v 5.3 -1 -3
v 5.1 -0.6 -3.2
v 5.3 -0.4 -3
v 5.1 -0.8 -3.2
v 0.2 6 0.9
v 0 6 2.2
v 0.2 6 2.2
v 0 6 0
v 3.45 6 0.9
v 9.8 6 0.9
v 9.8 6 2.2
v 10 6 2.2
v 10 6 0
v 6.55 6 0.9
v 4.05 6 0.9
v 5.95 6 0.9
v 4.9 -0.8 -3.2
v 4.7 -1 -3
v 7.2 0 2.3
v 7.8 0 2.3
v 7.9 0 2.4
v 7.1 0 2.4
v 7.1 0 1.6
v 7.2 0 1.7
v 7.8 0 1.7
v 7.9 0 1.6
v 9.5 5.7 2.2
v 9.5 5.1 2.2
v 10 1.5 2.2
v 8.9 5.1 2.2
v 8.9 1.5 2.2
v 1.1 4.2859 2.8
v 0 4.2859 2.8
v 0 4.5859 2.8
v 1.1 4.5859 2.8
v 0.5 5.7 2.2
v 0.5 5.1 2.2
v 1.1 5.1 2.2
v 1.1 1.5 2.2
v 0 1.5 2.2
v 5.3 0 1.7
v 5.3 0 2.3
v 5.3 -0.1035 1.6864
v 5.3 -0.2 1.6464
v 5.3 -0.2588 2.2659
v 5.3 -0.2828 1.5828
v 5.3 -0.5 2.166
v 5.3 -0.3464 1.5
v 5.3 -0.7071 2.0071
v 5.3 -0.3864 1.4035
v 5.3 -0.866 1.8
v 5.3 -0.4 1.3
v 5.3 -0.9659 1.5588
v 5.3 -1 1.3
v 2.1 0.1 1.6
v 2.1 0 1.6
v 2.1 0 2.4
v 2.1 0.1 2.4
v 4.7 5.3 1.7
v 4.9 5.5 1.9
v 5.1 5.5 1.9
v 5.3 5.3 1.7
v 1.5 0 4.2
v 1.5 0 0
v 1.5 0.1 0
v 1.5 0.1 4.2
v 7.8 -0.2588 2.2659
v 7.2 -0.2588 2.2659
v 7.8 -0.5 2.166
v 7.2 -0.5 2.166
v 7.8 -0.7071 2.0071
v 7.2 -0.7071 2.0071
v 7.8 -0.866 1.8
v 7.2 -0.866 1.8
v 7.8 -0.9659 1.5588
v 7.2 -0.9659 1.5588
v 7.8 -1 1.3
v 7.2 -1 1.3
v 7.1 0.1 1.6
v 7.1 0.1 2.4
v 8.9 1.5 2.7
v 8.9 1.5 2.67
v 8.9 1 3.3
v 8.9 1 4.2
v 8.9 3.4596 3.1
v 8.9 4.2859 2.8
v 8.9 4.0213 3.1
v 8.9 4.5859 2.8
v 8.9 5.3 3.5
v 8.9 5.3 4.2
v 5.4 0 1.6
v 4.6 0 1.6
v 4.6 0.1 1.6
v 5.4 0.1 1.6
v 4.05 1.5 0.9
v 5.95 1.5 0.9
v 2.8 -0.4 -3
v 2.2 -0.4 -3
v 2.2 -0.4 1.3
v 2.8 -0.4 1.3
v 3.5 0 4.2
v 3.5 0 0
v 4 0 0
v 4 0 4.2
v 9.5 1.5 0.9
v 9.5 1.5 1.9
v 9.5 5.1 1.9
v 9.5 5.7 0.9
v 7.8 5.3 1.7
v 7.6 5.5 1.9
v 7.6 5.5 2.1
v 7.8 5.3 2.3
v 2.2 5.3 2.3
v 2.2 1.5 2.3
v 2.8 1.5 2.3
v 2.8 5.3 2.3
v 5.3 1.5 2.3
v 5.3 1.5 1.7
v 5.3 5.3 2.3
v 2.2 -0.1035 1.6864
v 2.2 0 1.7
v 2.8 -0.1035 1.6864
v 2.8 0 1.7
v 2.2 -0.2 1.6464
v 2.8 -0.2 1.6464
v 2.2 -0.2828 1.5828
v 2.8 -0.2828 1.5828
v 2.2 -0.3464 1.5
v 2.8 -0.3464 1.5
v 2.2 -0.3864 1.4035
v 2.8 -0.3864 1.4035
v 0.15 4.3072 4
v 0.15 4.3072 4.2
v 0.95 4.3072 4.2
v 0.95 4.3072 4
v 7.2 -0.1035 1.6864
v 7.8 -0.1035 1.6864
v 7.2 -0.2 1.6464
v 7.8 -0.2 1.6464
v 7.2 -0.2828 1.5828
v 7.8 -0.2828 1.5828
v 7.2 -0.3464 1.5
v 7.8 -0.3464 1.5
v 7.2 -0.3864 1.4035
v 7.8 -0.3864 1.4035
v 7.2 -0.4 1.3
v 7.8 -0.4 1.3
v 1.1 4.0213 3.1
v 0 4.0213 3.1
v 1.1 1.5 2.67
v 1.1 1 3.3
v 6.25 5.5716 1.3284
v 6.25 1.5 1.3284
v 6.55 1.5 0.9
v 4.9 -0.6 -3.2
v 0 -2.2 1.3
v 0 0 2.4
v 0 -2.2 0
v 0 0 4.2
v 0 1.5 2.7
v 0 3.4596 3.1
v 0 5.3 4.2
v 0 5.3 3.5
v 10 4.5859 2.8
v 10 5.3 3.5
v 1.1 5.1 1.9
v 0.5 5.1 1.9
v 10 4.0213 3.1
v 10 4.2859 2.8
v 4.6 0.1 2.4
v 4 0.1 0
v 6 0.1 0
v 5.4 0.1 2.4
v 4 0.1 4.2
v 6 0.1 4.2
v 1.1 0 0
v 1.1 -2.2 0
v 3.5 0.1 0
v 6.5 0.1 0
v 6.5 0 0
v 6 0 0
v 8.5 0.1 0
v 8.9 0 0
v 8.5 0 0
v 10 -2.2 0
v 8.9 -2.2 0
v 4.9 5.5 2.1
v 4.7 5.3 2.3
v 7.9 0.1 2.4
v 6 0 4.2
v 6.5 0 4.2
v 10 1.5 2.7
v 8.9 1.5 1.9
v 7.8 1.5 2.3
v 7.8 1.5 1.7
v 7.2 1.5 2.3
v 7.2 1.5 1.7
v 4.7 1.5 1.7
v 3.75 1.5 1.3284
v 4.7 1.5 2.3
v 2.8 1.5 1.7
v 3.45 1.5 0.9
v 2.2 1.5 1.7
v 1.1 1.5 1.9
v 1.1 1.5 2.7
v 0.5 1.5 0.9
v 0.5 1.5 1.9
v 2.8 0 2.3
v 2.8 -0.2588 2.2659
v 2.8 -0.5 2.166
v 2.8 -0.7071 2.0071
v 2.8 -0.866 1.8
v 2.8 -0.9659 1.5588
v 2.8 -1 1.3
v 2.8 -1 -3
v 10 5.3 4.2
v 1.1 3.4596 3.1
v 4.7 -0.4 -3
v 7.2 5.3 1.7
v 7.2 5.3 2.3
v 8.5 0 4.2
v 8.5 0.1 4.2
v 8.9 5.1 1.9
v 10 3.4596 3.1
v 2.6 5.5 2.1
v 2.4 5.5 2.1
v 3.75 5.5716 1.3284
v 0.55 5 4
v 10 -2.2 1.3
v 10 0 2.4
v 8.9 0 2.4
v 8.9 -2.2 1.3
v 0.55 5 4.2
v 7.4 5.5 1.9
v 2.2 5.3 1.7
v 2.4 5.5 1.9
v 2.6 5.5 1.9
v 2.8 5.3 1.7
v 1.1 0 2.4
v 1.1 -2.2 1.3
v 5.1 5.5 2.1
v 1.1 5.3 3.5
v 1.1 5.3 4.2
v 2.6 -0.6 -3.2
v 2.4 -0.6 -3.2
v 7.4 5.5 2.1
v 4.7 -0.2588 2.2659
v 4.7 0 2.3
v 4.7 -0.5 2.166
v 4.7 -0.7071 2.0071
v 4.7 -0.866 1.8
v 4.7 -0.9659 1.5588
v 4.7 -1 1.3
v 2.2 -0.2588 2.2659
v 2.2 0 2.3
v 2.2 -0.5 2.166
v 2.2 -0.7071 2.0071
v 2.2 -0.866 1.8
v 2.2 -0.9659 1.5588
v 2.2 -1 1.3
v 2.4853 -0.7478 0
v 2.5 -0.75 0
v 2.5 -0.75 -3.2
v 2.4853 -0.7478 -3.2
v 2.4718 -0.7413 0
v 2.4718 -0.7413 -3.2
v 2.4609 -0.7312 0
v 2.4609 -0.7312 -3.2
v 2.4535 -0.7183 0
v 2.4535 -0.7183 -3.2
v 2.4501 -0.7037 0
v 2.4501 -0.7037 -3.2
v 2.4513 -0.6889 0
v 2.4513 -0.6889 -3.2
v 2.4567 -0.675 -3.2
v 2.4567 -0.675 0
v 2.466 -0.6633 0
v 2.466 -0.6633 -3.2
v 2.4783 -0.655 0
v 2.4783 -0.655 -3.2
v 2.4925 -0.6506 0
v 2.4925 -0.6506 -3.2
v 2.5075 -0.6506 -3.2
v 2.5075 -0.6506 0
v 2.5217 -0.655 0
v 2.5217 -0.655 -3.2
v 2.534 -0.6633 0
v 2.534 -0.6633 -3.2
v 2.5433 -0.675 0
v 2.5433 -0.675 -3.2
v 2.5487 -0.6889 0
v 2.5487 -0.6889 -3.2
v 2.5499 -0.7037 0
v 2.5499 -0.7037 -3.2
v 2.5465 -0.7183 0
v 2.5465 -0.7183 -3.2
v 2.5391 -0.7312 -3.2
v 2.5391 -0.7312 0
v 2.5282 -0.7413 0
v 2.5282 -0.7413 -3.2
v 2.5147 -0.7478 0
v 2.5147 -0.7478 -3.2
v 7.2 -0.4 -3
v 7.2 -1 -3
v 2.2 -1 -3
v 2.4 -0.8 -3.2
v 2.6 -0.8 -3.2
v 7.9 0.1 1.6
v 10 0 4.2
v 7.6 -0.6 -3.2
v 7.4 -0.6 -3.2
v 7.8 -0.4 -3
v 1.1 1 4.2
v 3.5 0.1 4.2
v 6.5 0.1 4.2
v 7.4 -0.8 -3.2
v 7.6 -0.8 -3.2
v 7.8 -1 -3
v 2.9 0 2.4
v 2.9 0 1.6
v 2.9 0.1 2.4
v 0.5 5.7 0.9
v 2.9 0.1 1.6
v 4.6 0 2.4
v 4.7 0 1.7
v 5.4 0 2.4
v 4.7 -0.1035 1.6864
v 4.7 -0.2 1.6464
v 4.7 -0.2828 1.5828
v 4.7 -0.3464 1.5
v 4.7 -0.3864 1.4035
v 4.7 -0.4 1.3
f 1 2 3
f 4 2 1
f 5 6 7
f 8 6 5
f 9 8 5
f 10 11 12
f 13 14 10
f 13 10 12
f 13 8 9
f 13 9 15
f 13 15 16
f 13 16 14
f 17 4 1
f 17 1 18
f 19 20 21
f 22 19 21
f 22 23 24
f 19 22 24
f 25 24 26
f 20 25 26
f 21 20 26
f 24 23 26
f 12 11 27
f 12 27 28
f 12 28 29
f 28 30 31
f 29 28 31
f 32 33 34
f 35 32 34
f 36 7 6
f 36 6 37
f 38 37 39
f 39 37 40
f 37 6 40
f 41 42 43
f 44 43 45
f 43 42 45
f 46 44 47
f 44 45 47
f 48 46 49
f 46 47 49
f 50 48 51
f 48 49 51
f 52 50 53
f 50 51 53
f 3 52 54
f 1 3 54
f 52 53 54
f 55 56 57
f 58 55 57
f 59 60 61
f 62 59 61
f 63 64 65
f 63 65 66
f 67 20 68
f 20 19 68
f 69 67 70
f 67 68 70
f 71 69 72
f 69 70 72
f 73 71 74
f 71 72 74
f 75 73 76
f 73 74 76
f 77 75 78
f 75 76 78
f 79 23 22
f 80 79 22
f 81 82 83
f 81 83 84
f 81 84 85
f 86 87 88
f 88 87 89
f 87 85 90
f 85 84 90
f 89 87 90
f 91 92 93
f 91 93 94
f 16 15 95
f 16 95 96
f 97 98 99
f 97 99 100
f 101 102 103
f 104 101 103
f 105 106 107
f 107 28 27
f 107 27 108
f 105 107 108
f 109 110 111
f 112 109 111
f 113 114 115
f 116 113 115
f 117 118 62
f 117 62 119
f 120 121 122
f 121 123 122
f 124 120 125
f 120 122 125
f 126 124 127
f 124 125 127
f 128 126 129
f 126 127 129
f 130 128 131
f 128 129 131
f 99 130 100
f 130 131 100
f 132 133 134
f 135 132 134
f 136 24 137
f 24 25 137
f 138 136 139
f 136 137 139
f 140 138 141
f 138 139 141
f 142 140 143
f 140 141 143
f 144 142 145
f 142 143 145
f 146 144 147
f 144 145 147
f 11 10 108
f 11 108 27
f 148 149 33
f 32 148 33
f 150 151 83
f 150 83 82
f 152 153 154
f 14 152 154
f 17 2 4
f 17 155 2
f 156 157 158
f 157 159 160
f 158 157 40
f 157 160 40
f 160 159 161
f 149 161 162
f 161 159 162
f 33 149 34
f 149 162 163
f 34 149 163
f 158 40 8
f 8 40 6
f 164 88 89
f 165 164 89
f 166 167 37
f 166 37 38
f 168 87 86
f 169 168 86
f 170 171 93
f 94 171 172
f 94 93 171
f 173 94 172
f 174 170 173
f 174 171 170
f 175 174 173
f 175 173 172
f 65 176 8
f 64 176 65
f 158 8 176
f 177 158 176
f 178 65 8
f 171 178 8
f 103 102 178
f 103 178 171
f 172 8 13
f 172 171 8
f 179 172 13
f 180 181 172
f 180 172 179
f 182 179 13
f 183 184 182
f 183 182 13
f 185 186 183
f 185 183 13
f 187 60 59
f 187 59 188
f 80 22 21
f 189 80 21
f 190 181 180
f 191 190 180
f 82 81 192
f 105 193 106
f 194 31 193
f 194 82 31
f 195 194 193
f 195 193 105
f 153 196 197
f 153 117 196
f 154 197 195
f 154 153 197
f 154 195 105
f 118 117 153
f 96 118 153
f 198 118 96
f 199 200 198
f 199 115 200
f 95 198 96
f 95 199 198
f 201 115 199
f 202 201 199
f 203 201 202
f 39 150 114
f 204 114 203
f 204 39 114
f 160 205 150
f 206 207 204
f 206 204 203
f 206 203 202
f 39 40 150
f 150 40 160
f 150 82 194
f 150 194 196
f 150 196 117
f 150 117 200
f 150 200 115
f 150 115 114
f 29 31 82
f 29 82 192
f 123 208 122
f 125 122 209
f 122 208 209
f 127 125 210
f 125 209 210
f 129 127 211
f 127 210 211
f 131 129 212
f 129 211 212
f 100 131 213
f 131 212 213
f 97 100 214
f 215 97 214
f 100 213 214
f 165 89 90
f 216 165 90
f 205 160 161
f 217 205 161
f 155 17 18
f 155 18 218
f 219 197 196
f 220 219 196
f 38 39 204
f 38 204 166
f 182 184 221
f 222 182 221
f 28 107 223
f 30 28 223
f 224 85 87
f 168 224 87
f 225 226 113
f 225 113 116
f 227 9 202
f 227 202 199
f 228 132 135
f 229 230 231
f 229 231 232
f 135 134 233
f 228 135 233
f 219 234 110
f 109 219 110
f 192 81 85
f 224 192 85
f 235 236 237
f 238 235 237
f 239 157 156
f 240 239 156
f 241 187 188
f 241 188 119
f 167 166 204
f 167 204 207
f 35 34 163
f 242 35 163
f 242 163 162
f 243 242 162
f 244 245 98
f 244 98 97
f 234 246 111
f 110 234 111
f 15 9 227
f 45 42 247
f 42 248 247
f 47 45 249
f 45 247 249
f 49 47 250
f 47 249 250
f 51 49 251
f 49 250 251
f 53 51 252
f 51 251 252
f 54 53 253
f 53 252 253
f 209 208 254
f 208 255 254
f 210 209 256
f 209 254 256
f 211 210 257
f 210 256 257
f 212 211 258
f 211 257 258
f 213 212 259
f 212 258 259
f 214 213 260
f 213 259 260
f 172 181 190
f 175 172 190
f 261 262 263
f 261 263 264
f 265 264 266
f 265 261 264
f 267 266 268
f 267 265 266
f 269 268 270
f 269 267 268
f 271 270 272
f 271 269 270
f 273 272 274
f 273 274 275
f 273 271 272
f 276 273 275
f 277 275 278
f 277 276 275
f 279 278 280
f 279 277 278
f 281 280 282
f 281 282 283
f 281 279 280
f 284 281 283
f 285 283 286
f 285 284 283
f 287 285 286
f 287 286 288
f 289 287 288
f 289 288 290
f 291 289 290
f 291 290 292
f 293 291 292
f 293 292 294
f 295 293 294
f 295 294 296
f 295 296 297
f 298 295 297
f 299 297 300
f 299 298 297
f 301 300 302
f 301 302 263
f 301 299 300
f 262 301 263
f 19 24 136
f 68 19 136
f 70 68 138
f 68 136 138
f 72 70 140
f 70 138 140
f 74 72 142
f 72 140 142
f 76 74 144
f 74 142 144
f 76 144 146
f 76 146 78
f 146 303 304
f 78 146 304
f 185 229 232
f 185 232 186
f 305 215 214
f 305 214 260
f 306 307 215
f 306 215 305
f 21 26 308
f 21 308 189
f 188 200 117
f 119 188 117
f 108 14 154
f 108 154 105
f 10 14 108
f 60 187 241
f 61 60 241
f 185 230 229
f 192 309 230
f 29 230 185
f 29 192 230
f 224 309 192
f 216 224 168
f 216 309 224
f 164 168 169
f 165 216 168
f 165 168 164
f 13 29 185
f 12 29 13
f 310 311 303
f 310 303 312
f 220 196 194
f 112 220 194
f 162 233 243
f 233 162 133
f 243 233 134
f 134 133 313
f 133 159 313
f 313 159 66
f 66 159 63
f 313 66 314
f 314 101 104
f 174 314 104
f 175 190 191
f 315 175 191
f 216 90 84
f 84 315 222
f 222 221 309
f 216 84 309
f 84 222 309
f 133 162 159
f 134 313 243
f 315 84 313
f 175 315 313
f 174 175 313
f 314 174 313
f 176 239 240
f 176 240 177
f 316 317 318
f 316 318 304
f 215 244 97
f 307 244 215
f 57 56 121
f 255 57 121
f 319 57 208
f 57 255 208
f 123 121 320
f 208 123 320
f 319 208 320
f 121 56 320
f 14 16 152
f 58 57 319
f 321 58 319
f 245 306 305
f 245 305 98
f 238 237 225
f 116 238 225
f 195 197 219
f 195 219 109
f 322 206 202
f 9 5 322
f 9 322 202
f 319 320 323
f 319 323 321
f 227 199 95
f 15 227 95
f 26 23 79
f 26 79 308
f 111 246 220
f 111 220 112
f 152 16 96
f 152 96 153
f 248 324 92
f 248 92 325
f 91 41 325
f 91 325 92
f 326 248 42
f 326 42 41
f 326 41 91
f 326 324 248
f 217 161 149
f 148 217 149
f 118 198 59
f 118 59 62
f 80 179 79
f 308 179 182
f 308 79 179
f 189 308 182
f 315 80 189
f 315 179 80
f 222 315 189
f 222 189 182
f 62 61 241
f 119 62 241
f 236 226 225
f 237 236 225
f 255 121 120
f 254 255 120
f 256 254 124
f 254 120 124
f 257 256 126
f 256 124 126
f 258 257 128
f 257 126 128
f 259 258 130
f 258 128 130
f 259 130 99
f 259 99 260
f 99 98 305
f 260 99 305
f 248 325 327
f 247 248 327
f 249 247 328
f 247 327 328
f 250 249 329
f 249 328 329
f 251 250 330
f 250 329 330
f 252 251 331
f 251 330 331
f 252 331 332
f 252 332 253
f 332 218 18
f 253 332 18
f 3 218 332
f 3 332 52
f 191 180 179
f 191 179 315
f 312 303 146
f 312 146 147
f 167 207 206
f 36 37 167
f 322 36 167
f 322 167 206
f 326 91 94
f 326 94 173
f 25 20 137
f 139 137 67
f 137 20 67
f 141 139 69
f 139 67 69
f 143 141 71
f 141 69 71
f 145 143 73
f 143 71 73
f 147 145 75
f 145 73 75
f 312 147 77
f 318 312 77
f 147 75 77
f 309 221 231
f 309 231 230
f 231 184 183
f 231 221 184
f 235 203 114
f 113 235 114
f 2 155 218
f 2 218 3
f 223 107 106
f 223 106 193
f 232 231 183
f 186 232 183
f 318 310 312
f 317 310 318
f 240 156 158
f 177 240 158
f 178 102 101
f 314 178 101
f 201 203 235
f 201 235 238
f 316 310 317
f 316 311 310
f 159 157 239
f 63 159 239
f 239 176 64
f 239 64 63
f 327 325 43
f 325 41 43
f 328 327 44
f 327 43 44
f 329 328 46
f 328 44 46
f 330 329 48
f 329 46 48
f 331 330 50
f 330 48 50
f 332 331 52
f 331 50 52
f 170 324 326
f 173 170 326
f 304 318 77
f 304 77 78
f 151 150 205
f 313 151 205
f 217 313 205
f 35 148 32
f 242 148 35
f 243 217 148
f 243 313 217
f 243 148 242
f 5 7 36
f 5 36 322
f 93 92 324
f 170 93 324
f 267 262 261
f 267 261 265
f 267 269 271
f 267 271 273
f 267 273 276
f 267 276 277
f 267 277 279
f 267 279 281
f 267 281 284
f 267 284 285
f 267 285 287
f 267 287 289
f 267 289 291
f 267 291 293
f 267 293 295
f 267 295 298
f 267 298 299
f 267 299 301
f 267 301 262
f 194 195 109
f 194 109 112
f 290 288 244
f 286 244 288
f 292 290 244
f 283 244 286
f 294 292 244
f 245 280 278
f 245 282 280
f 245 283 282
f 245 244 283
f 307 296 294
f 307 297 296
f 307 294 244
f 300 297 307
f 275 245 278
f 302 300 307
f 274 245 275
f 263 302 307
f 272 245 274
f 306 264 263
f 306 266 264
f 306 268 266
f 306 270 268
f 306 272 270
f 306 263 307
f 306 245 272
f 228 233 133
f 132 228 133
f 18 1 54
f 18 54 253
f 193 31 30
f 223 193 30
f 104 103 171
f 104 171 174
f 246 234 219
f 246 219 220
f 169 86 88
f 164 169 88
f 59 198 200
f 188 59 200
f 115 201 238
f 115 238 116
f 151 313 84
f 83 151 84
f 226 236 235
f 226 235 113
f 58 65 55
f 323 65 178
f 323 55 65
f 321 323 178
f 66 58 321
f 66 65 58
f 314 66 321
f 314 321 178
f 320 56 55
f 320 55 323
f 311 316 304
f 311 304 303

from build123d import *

# Parameters (mm, degrees)
SKETCH_1_W                         = 10
SKETCH_1_H                         = 4.2
EXTRUDE_1_DEPTH                    = 6
CUT_EXTRUDE_1_DEPTH                = 5
CUT_EXTRUDE_2_DEPTH                = 13.395160346
EXTRUDE_6_DEPTH                    = 1.1
CUT_EXTRUDE_3_REACH                = 14.395
SKETCH_5_W                         = 7.8
SKETCH_5_H                         = 4.3
EXTRUDE_3_REACH                    = 13.995
EXTRUDE_5_REACH                    = 15.597
SKETCH_11_W                        = 2
SKETCH_11_H                        = 4.2
SKETCH_11_W_2                      = 0.8
SKETCH_11_H_2                      = 0.8
CUT_EXTRUDE_5_DEPTH                = 0.1
SKETCH_15_R                        = 0.05
CUT_EXTRUDE_6_DEPTH                = 0.1
PATTERN_LINEAR_2_COUNT             = 2
PATTERN_LINEAR_2_PITCH             = 2.5
CUT_EXTRUDE_7_DEPTH                = 0.2
SKETCH_7_W                         = 0.6
SKETCH_7_H                         = 0.6
EXTRUDE_4_DEPTH                    = 5.5
SKETCH_18_W                        = 0.6
SKETCH_18_H                        = 0.6
CHAMFER_6_SIZE                     = 0.2
PATTERN_LINEAR_1_COUNT             = 3
PATTERN_LINEAR_1_PITCH             = 2.5
CHAMFER_6_OF_PATTERN_LINEAR_1_SIZE = 0.2
CUT_EXTRUDE_4_REACH                = 13.995
SKETCH_20_W                        = 0.6
SKETCH_20_H                        = 0.3
CUT_EXTRUDE_9_DEPTH                = 0.9
CHAMFER_5_SIZE                     = 0.3
SKETCH_19_R                        = 0.05
CUT_EXTRUDE_8_DEPTH                = 3.2


with BuildPart() as part:
    # Эскиз1 → Бобышка-Вытянуть1 (new body)
    with BuildSketch(Plane(origin=(0, 0, 0), x_dir=(1, 0, 0), z_dir=(0, 1, 0))):
        with Locations((5, -2.1)):
            Rectangle(SKETCH_1_W, SKETCH_1_H)
    extrude(amount=EXTRUDE_1_DEPTH)

    # Эскиз2 → Вырез-Вытянуть1 (cut)
    with BuildSketch(Plane(origin=(0, 6, 0), x_dir=(1, 0, 0), z_dir=(0, 1, 0))):
        Polygon((0.5, -0.9), (9.5, -0.9), (9.5, -1.9), (8.9, -1.9), (8.9, -3.7), (1.1, -3.7), (1.1, -1.9), (0.5, -1.9), align=None)
    extrude(amount=-CUT_EXTRUDE_1_DEPTH, mode=Mode.SUBTRACT)

    # Эскиз3 → Вырез-Вытянуть2 (cut, through all)
    with BuildSketch(Plane.ZY):
        Polygon((2.2, 6), (2.2, 1.5), (2.7, 1.5), (3.1, 3.459591794), (3.1, 4.021282026), (2.8, 4.285857157), (2.8, 4.585857157), (3.5, 5.3), (4.2, 5.3), (4.2, 6), align=None)
    extrude(amount=-CUT_EXTRUDE_2_DEPTH, mode=Mode.SUBTRACT)

    # Эскиз16 → Бобышка-Вытянуть6 (add)
    with BuildSketch(Plane(origin=(10, 0, 0), x_dir=(0, 0, -1), z_dir=(1, 0, 0))):
        Polygon((-2.4, 0), (-1.3, -2.2), (0, -2.2), (0, 0), align=None)
    extrude_6 = extrude(amount=-EXTRUDE_6_DEPTH)

    # Зеркальное отражение2: Бобышка-Вытянуть6 across plane
    add(extrude_6.mirror(Plane(origin=(5, 0, 0), x_dir=(0, 0, 1), z_dir=(1, 0, 0))))

    # Эскиз5 → Вырез-Вытянуть3 (cut, up to next)
    with BuildSketch(Plane.XY.offset(4.2), mode=Mode.PRIVATE) as cut_extrude_3_sk1:
        with Locations((5, 3.15)):
            Rectangle(SKETCH_5_W, SKETCH_5_H)
    cut_extrude_3_tool1 = extrude(cut_extrude_3_sk1.sketch, amount=-CUT_EXTRUDE_3_REACH, mode=Mode.PRIVATE) & part.part
    add(cut_extrude_3_tool1.solids().sort_by_distance((5, 3.15, 4.2))[0], mode=Mode.SUBTRACT)

    # Эскиз6 → Бобышка-Вытянуть3 (add, up to next)
    with BuildSketch(Plane(origin=(0.5, 0, 0), x_dir=(0, 0, -1), z_dir=(1, 0, 0)), mode=Mode.PRIVATE) as extrude_3_sk1:
        Polygon((-3.3, 1), (-2.67, 1.5), (-0.9, 1.5), (-0.9, 1), align=None)
    extrude_3_tool1 = extrude(extrude_3_sk1.sketch, amount=EXTRUDE_3_REACH, mode=Mode.PRIVATE) - part.part
    add(extrude_3_tool1.solids().sort_by_distance((0.5, 1.23741, 1.950432))[0])

    # Эскиз9 → Бобышка-Вытянуть5 (add, up to next)
    with BuildSketch(Plane(origin=(0, 6, 0), x_dir=(1, 0, 0), z_dir=(0, 1, 0)), mode=Mode.PRIVATE) as extrude_5_sk1:
        Polygon((3.45, -0.9), (3.75, -1.328444402), (4.05, -0.9), align=None)
    extrude_5_tool1 = extrude(extrude_5_sk1.sketch, amount=-EXTRUDE_5_REACH, mode=Mode.PRIVATE) - part.part
    extrude_5 = extrude_5_tool1.solids().sort_by_distance((3.75, 6, 1.042815))[0]
    add(extrude_5)

    # Эскиз11 → Вырез-Вытянуть5 (cut)
    with BuildSketch(Plane.XZ):
        with Locations((2.5, 2.1)):
            Rectangle(SKETCH_11_W, SKETCH_11_H)
        with Locations((2.5, 2)):
            Rectangle(SKETCH_11_W_2, SKETCH_11_H_2, mode=Mode.SUBTRACT)
    cut_extrude_5 = extrude(amount=-CUT_EXTRUDE_5_DEPTH, mode=Mode.SUBTRACT)

    # Эскиз15 → Вырез-Вытянуть6 (cut)
    with BuildSketch(Plane.XZ):
        with Locations(Location((2.5, 2, 0), (0, 0, 270))):
            Circle(SKETCH_15_R)
    extrude(amount=-CUT_EXTRUDE_6_DEPTH, mode=Mode.SUBTRACT)

    # Линейный массив2: Бобышка-Вытянуть5 ×2
    with Locations(*[(i * PATTERN_LINEAR_2_PITCH, 0, 0) for i in range(1, PATTERN_LINEAR_2_COUNT)]):
        add(extrude_5)

    # Эскиз17 → Вырез-Вытянуть7 (cut)
    with BuildSketch(Plane.XY.offset(4.2)):
        Polygon((0.55, 5), (0.15, 4.307179677), (0.95, 4.307179677), align=None)
    extrude(amount=-CUT_EXTRUDE_7_DEPTH, mode=Mode.SUBTRACT)

    # Эскиз7 → Бобышка-Вытянуть4 (add)
    with BuildSketch(Plane.XZ):
        with Locations((2.5, 2)):
            Rectangle(SKETCH_7_W, SKETCH_7_H)
    extrude_4 = extrude(amount=-EXTRUDE_4_DEPTH)

    # По траектории1: sweep along a curve in space
    with BuildLine() as sweep_1_path:
        Line((2.5, -0.7, 1.3), (2.5, -0.7, -3.2))
        ThreePointArc((2.5, 0, 2), (2.5, -0.494974747, 1.794974747), (2.5, -0.7, 1.3))
    # Эскиз18 → По траектории1 (sweep)
    with BuildSketch(Plane.XZ):
        with Locations((2.5, 2)):
            Rectangle(SKETCH_18_W, SKETCH_18_H)
    sweep_1 = sweep(path=sweep_1_path.line)

    # Фаска6
    chamfer_6_edges = [part.edges().sort_by_distance(p)[0] for p in [
        (2.8, 5.5, 2),
        (2.5, 5.5, 1.7),
        (2.2, 5.5, 2),
        (2.5, 5.5, 2.3),
        (2.8, -0.7, -3.2),
        (2.5, -1, -3.2),
        (2.2, -0.7, -3.2),
        (2.5, -0.4, -3.2),
    ]]
    chamfer(chamfer_6_edges, length=CHAMFER_6_SIZE)

    # Линейный массив1: Вырез-Вытянуть5, Бобышка-Вытянуть4, По траектории1 ×3
    with Locations(*[(i * PATTERN_LINEAR_1_PITCH, 0, 0) for i in range(1, PATTERN_LINEAR_1_COUNT)]):
        add(cut_extrude_5, mode=Mode.SUBTRACT)
        add(extrude_4)
        add(sweep_1)

    # Фаска6 of Линейный массив1
    chamfer_6_of_pattern_linear_1_edges = [part.edges().sort_by_distance(p)[0] for p in [
        (5.3, 5.5, 2),
        (5, 5.5, 1.7),
        (4.7, 5.5, 2),
        (5, 5.5, 2.3),
        (5.3, -0.7, -3.2),
        (5, -1, -3.2),
        (4.7, -0.7, -3.2),
        (5, -0.4, -3.2),
        (7.8, 5.5, 2),
        (7.5, 5.5, 1.7),
        (7.2, 5.5, 2),
        (7.5, 5.5, 2.3),
        (7.8, -0.7, -3.2),
        (7.5, -1, -3.2),
        (7.2, -0.7, -3.2),
        (7.5, -0.4, -3.2),
    ]]
    chamfer(chamfer_6_of_pattern_linear_1_edges, length=CHAMFER_6_OF_PATTERN_LINEAR_1_SIZE)

    # Вырез-Вытянуть4: up to this face of the body (flat: up to its plane)
    cut_extrude_4_end = Plane(part.part.faces().sort_by_distance((9.5, 3.75, 1.4))[0])
    # Эскиз10 → Вырез-Вытянуть4 (cut, up to the picked face)
    with BuildSketch(Plane(origin=(0.5, 0, 0), x_dir=(0, 0, -1), z_dir=(1, 0, 0)), mode=Mode.PRIVATE) as cut_extrude_4_sk1:
        Polygon((-1.4, 6), (-0.9, 6), (-1.4, 5.5), align=None)
    cut_extrude_4_tool1 = split(extrude(cut_extrude_4_sk1.sketch, amount=CUT_EXTRUDE_4_REACH, mode=Mode.PRIVATE), bisect_by=cut_extrude_4_end, keep=Keep.BOTH, mode=Mode.PRIVATE)
    add(cut_extrude_4_tool1.solids().sort_by(Axis((0.5, 5.833333, 1.233333), (1, 0, 0)))[0], mode=Mode.SUBTRACT)

    # Эскиз20 → Вырез-Вытянуть9 (cut)
    with BuildSketch(Plane(origin=(0, 6, 0), x_dir=(1, 0, 0), z_dir=(0, 1, 0))):
        with Locations((0.8, -2.05)):
            Rectangle(SKETCH_20_W, SKETCH_20_H)
    cut_extrude_9 = extrude(amount=-CUT_EXTRUDE_9_DEPTH, mode=Mode.SUBTRACT)

    # Зеркальное отражение3: Вырез-Вытянуть9 across plane
    add(cut_extrude_9.mirror(Plane(origin=(5, 0, 0), x_dir=(0, 0, 1), z_dir=(1, 0, 0))), mode=Mode.SUBTRACT)

    # Фаска5
    chamfer_5_edges = [part.edges().sort_by_distance(p)[0] for p in [
        (0.5, 6, 1.55),
        (9.5, 6, 1.55),
    ]]
    chamfer(chamfer_5_edges, length=CHAMFER_5_SIZE)

    # Эскиз19 → Вырез-Вытянуть8 (cut)
    with BuildSketch(Plane(origin=(0, 0, 0), x_dir=(-1, 0, 0), z_dir=(0, 0, -1))):
        with Locations(Location((-2.5, -0.7, 0), (0, 0, 270))):
            Circle(SKETCH_19_R)
    extrude(amount=CUT_EXTRUDE_8_DEPTH, mode=Mode.SUBTRACT)


solid = part.part
